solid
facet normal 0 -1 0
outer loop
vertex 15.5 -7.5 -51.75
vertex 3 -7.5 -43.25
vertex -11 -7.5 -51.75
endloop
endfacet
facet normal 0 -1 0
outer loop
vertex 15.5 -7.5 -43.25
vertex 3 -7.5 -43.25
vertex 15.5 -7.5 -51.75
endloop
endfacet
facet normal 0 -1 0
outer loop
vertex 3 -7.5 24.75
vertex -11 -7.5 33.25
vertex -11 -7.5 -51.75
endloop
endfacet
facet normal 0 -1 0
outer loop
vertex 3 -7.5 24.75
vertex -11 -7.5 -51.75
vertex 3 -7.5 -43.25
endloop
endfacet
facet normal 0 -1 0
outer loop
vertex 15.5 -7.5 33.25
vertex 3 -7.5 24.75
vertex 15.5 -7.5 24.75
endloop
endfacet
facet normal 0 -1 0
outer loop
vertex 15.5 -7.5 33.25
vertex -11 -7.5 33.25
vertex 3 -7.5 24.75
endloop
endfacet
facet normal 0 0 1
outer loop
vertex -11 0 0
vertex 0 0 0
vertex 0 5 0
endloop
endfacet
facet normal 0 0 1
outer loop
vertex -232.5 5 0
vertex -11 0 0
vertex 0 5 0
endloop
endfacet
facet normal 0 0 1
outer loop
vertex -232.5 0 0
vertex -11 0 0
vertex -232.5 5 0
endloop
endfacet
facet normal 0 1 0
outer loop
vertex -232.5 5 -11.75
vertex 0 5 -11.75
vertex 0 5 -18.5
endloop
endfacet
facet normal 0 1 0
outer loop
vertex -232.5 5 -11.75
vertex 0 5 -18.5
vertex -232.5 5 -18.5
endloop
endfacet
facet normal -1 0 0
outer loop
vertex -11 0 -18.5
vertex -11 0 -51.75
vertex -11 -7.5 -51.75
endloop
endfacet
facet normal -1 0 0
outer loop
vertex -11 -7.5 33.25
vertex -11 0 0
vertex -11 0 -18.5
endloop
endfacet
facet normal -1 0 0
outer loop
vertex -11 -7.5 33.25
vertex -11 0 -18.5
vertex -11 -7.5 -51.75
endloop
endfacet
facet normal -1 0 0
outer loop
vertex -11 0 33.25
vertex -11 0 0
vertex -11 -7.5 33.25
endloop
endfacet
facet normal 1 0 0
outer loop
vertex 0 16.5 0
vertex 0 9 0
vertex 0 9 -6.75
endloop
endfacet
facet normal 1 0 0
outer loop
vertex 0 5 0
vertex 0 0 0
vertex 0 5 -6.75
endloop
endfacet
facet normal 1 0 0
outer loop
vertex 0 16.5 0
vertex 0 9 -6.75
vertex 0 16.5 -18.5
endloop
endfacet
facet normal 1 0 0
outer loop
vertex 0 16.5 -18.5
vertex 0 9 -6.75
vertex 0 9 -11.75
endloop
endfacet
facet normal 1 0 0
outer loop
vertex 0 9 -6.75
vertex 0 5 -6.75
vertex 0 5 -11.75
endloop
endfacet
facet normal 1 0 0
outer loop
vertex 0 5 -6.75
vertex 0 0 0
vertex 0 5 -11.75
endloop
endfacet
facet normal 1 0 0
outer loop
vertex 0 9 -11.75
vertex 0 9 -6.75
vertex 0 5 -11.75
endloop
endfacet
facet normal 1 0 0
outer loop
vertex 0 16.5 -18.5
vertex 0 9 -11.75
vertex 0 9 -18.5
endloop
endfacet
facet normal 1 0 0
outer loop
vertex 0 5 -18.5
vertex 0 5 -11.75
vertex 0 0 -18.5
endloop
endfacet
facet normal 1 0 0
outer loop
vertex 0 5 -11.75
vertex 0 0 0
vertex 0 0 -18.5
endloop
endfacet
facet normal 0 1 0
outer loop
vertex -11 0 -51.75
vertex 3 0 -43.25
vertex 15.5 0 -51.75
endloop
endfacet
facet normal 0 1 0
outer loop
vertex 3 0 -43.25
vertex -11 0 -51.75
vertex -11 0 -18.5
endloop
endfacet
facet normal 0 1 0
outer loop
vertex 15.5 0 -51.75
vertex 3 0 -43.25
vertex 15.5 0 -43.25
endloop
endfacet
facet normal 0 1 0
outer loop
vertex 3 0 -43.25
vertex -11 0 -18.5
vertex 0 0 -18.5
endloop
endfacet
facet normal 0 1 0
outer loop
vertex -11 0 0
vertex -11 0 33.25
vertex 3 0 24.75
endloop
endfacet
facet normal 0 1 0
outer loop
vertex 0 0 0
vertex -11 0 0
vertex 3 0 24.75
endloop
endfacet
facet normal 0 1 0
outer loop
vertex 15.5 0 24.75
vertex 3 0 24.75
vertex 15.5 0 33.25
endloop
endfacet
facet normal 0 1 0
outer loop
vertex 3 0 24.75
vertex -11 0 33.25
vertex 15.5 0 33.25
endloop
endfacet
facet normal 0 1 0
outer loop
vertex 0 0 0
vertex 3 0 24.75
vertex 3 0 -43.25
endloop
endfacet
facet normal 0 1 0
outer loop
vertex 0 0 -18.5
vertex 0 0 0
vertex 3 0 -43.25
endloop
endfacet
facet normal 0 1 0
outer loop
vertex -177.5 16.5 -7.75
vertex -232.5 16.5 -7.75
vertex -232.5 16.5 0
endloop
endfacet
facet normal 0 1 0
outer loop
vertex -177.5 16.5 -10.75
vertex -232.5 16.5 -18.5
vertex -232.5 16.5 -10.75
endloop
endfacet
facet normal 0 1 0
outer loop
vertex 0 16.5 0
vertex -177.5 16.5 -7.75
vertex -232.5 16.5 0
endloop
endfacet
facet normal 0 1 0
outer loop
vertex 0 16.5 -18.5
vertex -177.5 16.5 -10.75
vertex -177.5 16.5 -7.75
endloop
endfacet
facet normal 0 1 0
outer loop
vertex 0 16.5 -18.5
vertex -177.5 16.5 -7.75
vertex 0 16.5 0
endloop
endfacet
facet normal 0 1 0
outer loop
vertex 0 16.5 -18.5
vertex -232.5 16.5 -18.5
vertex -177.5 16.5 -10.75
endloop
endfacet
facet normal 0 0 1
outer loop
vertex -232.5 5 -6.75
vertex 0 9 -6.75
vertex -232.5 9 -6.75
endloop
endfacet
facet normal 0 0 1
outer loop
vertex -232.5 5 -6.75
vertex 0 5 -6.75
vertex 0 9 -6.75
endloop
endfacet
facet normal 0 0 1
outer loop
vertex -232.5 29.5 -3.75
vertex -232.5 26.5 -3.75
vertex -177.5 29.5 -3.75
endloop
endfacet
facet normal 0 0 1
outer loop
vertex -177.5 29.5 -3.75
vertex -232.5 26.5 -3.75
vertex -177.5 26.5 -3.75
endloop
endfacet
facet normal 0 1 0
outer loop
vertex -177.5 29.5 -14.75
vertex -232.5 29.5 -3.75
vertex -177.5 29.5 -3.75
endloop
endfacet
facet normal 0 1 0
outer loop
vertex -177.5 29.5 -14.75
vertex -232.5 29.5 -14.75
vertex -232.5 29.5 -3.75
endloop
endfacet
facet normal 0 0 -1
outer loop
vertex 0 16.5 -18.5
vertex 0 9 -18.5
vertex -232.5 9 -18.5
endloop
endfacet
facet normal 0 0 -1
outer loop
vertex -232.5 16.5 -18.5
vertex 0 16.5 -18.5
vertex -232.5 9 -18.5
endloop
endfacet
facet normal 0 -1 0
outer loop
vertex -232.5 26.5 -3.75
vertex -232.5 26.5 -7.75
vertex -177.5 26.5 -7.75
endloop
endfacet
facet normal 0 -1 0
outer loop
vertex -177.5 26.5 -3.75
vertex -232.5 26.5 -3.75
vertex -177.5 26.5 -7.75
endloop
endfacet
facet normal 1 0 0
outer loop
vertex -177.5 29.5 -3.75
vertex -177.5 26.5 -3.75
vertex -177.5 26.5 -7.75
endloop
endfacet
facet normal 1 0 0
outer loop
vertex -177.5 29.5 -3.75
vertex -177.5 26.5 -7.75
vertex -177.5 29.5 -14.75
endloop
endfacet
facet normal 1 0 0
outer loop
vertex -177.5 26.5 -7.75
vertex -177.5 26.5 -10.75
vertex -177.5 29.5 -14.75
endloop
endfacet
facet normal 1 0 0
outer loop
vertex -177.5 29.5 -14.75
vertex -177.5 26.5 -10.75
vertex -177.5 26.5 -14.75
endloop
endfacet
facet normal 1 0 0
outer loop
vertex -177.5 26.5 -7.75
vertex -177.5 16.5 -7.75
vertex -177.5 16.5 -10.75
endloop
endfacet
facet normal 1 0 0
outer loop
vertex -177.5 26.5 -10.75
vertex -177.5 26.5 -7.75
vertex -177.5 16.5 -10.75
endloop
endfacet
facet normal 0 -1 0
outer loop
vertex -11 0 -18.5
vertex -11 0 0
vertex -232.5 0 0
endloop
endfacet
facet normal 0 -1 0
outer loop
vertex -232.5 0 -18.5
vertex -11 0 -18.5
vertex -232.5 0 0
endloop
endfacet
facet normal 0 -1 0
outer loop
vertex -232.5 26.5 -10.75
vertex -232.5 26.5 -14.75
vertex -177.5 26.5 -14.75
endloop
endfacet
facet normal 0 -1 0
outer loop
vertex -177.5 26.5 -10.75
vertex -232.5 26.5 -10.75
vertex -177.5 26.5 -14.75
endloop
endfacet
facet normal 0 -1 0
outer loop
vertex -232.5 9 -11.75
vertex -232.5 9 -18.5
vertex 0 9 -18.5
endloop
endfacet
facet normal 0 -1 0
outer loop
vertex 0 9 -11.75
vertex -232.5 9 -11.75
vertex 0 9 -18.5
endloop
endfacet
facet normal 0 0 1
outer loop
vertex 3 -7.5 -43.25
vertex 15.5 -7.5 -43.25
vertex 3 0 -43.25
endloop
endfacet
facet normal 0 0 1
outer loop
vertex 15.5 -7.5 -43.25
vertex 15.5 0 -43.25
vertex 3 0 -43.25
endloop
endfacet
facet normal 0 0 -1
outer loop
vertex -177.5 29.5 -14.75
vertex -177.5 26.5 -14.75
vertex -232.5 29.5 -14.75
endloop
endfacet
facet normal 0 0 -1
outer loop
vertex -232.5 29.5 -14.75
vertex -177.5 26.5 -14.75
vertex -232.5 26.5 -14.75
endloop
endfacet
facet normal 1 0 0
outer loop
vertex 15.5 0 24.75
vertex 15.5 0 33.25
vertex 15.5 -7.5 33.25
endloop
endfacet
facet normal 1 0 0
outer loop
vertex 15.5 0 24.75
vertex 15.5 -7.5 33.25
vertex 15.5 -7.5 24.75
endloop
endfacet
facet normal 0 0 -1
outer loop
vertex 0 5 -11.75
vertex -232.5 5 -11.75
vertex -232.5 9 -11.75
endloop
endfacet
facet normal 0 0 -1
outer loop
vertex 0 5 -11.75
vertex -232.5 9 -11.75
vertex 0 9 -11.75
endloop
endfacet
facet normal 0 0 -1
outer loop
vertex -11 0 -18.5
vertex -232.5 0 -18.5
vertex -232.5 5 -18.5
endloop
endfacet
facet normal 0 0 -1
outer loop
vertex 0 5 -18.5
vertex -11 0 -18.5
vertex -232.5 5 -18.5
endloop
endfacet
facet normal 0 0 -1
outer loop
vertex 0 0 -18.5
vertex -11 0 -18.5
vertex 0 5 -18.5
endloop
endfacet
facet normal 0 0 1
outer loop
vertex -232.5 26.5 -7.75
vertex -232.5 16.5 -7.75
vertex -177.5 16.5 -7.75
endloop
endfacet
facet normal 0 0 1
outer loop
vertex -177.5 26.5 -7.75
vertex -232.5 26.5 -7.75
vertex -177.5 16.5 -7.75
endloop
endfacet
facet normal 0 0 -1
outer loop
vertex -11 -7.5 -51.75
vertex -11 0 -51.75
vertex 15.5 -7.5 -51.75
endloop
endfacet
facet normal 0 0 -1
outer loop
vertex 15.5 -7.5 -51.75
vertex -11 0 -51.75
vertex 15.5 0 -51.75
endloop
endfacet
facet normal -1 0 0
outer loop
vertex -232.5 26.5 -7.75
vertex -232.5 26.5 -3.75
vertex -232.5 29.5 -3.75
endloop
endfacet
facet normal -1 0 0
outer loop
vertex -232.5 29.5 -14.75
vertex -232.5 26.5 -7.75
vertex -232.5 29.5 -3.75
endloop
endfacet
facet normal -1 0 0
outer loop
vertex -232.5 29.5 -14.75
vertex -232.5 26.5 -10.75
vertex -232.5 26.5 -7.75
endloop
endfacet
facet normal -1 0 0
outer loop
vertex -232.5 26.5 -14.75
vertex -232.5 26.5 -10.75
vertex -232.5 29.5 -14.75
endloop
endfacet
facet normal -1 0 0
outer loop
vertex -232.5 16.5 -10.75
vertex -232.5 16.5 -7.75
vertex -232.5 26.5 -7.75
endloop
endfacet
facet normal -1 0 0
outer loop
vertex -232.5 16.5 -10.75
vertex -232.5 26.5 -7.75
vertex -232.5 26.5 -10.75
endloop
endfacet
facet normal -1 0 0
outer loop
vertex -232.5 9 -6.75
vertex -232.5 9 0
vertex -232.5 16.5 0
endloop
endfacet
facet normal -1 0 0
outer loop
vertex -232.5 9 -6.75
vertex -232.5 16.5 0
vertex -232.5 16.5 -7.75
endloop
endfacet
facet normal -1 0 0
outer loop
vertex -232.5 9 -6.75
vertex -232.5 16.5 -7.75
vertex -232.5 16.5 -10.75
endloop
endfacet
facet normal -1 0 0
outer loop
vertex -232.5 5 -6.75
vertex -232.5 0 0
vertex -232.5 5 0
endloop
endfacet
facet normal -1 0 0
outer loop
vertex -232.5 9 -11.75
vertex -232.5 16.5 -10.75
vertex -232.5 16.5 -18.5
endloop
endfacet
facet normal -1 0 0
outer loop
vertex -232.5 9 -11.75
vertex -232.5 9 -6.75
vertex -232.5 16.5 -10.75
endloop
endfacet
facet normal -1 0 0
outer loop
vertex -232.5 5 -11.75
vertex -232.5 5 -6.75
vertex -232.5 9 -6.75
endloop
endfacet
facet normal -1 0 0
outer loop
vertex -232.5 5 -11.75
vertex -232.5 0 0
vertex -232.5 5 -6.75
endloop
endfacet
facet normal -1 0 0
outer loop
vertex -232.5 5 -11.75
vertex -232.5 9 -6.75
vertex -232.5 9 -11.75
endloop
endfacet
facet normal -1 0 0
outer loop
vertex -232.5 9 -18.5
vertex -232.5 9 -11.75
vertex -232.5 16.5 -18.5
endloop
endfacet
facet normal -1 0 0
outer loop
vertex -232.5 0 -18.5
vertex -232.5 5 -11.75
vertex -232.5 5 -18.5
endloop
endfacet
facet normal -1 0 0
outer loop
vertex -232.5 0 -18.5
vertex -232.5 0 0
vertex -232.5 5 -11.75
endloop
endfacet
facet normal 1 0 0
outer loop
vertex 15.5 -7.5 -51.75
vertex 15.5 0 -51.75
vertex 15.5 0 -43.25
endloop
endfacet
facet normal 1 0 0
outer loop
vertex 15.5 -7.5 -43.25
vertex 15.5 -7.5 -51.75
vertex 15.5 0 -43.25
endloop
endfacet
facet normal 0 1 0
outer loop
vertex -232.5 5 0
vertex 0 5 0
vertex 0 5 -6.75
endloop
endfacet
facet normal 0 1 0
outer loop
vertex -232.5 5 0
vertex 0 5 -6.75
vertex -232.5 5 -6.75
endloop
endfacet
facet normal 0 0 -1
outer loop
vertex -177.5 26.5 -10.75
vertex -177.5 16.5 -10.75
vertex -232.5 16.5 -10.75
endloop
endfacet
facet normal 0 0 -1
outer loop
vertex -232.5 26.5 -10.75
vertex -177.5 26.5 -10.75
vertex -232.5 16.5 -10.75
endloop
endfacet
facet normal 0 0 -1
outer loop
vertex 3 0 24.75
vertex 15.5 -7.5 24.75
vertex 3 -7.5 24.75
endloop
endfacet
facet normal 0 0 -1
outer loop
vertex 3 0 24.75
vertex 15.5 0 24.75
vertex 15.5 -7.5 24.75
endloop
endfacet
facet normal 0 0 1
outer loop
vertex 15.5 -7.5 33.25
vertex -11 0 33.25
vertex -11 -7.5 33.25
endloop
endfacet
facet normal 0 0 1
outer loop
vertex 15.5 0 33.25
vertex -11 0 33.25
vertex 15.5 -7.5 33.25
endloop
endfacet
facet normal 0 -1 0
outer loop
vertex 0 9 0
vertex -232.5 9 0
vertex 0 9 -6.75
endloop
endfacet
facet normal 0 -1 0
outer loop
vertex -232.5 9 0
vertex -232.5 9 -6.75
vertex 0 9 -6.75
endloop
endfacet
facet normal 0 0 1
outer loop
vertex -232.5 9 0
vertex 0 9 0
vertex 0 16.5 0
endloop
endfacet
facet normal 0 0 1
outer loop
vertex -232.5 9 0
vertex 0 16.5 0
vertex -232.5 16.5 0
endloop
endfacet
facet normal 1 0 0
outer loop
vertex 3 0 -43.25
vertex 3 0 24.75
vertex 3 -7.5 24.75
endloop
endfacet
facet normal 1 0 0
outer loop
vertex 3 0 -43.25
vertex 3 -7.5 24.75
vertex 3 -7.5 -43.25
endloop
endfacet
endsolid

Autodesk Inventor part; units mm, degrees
ref_plane "YZ Plane" through (0, 0, 0) normal (1, 0, 0) x (0, 1, 0)
ref_plane "XZ Plane" through (0, 0, 0) normal (0, 1, 0) x (-1, 0, 0)
ref_plane "XY Plane" through (0, 0, 0) normal (0, 0, 1) x (1, 0, 0)
sketch "Esboço1" plane through (0, 0, 0) normal (0, 1, 0) x (-1, 0, 0)
  line L0 (0, 0) -> (0, -18.5)
  line L1 (0, 0) -> (232.5, 0)
  line L2 (232.5, 0) -> (232.5, -18.5)
  line L3 (232.5, -18.5) -> (0, -18.5)
  dimension "d0" = 18.5
  dimension "d1" = 232.5
extrude "Extrusão1" add sketch "Esboço1" along normal blind 5
sketch "Esboço2" plane through (0, 5, 0) normal (0, 1, 0) x (1, 0, 0)
  line L0 (0, 0) -> (0, 9.25)
  line L1 (0, 0) -> (0, 18.5) projected
  line L2 (0, 9.25) -> (0, 11.75)
  line L3 (0, 11.75) -> (0, 6.75)
  line L4 (0, 6.75) -> (-232.5, 6.75)
  line L5 (-232.5, 18.5) -> (-232.5, 0) projected
  line L6 (-232.5, 6.75) -> (-232.5, 11.75)
  line L7 (-232.5, 11.75) -> (0, 11.75)
  dimension "d4" = 2.5
  dimension "d5" = 5
extrude "Extrusão2" add sketch "Esboço2" along normal blind 4
sketch "Esboço3" plane through (0, 9, 0) normal (0, 1, 0) x (1, 0, 0)
  line L0 (-232.5, 6.75) -> (0, 6.75) projected
  line L1 (0, 0) -> (0, 18.5) projected
  line L2 (0, 6.75) -> (0, 18.5)
  line L3 (0, 18.5) -> (0, 0)
  line L4 (0, 0) -> (-232.5, 0)
  line L5 (0, 18.5) -> (-232.5, 18.5) projected
  line L6 (-232.5, 18.5) -> (-232.5, 11.75) projected
  line L7 (-232.5, 0) -> (-232.5, 18.5)
  line L8 (-232.5, 18.5) -> (0, 18.5)
extrude "Extrusão3" add sketch "Esboço3" along normal blind 7.5
sketch "Esboço4" plane through (0, 0, 0) normal (0, -1, 0) x (1, 0, 0)
  line L0 (-232.5, 0) -> (0, 0) projected
  line L1 (-11, -9.25) -> (-11, -51.75)
  line L2 (-11, -51.75) -> (15.5, -51.75)
  line L3 (15.5, -51.75) -> (15.5, -43.25)
  line L4 (15.5, -43.25) -> (3, -43.25)
  line L5 (-11, -9.25) -> (-11, 33.25)
  line L6 (-11, 33.25) -> (15.5, 33.25)
  line L7 (15.5, 33.25) -> (15.5, 24.75)
  line L8 (15.5, 24.75) -> (3, 24.75)
  line L9 (3, 24.75) -> (3, -43.25)
  dimension "d12" = 42.5
  dimension "d14" = 26.5
  dimension "d15" = 8.5
  dimension "d17" = 42.5
  dimension "d18" = 8.5
extrude "Extrusão4" add sketch "Esboço4" along normal blind 7.5
sketch "Esboço5" plane through (0, 16.5, 0) normal (0, 1, 0) x (1, 0, 0)
  line L0 (0, 18.5) -> (-232.5, 18.5) projected
  line L1 (-232.5, 18.5) -> (-232.5, 0) projected
  line L2 (-232.5, 9.25) -> (-232.5, 10.75)
  line L3 (-232.5, 10.75) -> (-232.5, 7.75)
  line L4 (-232.5, 7.75) -> (-177.5, 7.75)
  line L5 (-177.5, 7.75) -> (-177.5, 10.75)
  line L6 (0, 11.75) -> (-232.5, 11.75) projected
  line L7 (-177.5, 10.75) -> (-232.5, 10.75)
  point P0 (0, 0)
  dimension "d21" = 1.5
  dimension "d22" = 3
  dimension "d23" = 55
  dimension "d24" = 3
extrude "Extrusão5" add sketch "Esboço5" along normal blind 10
sketch "Esboço6" plane through (0, 26.5, 0) normal (0, 1, 0) x (1, 0, 0)
  line L0 (-232.5, 10.75) -> (-232.5, 7.75) projected
  line L1 (-232.5, 9.25) -> (-232.5, 14.75)
  line L2 (-232.5, 14.75) -> (-232.5, 3.75)
  line L3 (-232.5, 6.75) -> (-232.5, 0) projected
  line L4 (-232.5, 3.75) -> (-177.5, 3.75)
  line L5 (-177.5, 3.75) -> (-177.5, 14.75)
  line L6 (-177.5, 14.75) -> (-232.5, 14.75)
  line L7 (0, 18.5) -> (-232.5, 18.5) projected
  point P0 (0, 0)
  dimension "d27" = 5.5
  dimension "d28" = 11
  dimension "d29" = 55
extrude "Extrusão6" add sketch "Esboço6" along normal blind 3
properties part number "trilho sem cremalheira"
